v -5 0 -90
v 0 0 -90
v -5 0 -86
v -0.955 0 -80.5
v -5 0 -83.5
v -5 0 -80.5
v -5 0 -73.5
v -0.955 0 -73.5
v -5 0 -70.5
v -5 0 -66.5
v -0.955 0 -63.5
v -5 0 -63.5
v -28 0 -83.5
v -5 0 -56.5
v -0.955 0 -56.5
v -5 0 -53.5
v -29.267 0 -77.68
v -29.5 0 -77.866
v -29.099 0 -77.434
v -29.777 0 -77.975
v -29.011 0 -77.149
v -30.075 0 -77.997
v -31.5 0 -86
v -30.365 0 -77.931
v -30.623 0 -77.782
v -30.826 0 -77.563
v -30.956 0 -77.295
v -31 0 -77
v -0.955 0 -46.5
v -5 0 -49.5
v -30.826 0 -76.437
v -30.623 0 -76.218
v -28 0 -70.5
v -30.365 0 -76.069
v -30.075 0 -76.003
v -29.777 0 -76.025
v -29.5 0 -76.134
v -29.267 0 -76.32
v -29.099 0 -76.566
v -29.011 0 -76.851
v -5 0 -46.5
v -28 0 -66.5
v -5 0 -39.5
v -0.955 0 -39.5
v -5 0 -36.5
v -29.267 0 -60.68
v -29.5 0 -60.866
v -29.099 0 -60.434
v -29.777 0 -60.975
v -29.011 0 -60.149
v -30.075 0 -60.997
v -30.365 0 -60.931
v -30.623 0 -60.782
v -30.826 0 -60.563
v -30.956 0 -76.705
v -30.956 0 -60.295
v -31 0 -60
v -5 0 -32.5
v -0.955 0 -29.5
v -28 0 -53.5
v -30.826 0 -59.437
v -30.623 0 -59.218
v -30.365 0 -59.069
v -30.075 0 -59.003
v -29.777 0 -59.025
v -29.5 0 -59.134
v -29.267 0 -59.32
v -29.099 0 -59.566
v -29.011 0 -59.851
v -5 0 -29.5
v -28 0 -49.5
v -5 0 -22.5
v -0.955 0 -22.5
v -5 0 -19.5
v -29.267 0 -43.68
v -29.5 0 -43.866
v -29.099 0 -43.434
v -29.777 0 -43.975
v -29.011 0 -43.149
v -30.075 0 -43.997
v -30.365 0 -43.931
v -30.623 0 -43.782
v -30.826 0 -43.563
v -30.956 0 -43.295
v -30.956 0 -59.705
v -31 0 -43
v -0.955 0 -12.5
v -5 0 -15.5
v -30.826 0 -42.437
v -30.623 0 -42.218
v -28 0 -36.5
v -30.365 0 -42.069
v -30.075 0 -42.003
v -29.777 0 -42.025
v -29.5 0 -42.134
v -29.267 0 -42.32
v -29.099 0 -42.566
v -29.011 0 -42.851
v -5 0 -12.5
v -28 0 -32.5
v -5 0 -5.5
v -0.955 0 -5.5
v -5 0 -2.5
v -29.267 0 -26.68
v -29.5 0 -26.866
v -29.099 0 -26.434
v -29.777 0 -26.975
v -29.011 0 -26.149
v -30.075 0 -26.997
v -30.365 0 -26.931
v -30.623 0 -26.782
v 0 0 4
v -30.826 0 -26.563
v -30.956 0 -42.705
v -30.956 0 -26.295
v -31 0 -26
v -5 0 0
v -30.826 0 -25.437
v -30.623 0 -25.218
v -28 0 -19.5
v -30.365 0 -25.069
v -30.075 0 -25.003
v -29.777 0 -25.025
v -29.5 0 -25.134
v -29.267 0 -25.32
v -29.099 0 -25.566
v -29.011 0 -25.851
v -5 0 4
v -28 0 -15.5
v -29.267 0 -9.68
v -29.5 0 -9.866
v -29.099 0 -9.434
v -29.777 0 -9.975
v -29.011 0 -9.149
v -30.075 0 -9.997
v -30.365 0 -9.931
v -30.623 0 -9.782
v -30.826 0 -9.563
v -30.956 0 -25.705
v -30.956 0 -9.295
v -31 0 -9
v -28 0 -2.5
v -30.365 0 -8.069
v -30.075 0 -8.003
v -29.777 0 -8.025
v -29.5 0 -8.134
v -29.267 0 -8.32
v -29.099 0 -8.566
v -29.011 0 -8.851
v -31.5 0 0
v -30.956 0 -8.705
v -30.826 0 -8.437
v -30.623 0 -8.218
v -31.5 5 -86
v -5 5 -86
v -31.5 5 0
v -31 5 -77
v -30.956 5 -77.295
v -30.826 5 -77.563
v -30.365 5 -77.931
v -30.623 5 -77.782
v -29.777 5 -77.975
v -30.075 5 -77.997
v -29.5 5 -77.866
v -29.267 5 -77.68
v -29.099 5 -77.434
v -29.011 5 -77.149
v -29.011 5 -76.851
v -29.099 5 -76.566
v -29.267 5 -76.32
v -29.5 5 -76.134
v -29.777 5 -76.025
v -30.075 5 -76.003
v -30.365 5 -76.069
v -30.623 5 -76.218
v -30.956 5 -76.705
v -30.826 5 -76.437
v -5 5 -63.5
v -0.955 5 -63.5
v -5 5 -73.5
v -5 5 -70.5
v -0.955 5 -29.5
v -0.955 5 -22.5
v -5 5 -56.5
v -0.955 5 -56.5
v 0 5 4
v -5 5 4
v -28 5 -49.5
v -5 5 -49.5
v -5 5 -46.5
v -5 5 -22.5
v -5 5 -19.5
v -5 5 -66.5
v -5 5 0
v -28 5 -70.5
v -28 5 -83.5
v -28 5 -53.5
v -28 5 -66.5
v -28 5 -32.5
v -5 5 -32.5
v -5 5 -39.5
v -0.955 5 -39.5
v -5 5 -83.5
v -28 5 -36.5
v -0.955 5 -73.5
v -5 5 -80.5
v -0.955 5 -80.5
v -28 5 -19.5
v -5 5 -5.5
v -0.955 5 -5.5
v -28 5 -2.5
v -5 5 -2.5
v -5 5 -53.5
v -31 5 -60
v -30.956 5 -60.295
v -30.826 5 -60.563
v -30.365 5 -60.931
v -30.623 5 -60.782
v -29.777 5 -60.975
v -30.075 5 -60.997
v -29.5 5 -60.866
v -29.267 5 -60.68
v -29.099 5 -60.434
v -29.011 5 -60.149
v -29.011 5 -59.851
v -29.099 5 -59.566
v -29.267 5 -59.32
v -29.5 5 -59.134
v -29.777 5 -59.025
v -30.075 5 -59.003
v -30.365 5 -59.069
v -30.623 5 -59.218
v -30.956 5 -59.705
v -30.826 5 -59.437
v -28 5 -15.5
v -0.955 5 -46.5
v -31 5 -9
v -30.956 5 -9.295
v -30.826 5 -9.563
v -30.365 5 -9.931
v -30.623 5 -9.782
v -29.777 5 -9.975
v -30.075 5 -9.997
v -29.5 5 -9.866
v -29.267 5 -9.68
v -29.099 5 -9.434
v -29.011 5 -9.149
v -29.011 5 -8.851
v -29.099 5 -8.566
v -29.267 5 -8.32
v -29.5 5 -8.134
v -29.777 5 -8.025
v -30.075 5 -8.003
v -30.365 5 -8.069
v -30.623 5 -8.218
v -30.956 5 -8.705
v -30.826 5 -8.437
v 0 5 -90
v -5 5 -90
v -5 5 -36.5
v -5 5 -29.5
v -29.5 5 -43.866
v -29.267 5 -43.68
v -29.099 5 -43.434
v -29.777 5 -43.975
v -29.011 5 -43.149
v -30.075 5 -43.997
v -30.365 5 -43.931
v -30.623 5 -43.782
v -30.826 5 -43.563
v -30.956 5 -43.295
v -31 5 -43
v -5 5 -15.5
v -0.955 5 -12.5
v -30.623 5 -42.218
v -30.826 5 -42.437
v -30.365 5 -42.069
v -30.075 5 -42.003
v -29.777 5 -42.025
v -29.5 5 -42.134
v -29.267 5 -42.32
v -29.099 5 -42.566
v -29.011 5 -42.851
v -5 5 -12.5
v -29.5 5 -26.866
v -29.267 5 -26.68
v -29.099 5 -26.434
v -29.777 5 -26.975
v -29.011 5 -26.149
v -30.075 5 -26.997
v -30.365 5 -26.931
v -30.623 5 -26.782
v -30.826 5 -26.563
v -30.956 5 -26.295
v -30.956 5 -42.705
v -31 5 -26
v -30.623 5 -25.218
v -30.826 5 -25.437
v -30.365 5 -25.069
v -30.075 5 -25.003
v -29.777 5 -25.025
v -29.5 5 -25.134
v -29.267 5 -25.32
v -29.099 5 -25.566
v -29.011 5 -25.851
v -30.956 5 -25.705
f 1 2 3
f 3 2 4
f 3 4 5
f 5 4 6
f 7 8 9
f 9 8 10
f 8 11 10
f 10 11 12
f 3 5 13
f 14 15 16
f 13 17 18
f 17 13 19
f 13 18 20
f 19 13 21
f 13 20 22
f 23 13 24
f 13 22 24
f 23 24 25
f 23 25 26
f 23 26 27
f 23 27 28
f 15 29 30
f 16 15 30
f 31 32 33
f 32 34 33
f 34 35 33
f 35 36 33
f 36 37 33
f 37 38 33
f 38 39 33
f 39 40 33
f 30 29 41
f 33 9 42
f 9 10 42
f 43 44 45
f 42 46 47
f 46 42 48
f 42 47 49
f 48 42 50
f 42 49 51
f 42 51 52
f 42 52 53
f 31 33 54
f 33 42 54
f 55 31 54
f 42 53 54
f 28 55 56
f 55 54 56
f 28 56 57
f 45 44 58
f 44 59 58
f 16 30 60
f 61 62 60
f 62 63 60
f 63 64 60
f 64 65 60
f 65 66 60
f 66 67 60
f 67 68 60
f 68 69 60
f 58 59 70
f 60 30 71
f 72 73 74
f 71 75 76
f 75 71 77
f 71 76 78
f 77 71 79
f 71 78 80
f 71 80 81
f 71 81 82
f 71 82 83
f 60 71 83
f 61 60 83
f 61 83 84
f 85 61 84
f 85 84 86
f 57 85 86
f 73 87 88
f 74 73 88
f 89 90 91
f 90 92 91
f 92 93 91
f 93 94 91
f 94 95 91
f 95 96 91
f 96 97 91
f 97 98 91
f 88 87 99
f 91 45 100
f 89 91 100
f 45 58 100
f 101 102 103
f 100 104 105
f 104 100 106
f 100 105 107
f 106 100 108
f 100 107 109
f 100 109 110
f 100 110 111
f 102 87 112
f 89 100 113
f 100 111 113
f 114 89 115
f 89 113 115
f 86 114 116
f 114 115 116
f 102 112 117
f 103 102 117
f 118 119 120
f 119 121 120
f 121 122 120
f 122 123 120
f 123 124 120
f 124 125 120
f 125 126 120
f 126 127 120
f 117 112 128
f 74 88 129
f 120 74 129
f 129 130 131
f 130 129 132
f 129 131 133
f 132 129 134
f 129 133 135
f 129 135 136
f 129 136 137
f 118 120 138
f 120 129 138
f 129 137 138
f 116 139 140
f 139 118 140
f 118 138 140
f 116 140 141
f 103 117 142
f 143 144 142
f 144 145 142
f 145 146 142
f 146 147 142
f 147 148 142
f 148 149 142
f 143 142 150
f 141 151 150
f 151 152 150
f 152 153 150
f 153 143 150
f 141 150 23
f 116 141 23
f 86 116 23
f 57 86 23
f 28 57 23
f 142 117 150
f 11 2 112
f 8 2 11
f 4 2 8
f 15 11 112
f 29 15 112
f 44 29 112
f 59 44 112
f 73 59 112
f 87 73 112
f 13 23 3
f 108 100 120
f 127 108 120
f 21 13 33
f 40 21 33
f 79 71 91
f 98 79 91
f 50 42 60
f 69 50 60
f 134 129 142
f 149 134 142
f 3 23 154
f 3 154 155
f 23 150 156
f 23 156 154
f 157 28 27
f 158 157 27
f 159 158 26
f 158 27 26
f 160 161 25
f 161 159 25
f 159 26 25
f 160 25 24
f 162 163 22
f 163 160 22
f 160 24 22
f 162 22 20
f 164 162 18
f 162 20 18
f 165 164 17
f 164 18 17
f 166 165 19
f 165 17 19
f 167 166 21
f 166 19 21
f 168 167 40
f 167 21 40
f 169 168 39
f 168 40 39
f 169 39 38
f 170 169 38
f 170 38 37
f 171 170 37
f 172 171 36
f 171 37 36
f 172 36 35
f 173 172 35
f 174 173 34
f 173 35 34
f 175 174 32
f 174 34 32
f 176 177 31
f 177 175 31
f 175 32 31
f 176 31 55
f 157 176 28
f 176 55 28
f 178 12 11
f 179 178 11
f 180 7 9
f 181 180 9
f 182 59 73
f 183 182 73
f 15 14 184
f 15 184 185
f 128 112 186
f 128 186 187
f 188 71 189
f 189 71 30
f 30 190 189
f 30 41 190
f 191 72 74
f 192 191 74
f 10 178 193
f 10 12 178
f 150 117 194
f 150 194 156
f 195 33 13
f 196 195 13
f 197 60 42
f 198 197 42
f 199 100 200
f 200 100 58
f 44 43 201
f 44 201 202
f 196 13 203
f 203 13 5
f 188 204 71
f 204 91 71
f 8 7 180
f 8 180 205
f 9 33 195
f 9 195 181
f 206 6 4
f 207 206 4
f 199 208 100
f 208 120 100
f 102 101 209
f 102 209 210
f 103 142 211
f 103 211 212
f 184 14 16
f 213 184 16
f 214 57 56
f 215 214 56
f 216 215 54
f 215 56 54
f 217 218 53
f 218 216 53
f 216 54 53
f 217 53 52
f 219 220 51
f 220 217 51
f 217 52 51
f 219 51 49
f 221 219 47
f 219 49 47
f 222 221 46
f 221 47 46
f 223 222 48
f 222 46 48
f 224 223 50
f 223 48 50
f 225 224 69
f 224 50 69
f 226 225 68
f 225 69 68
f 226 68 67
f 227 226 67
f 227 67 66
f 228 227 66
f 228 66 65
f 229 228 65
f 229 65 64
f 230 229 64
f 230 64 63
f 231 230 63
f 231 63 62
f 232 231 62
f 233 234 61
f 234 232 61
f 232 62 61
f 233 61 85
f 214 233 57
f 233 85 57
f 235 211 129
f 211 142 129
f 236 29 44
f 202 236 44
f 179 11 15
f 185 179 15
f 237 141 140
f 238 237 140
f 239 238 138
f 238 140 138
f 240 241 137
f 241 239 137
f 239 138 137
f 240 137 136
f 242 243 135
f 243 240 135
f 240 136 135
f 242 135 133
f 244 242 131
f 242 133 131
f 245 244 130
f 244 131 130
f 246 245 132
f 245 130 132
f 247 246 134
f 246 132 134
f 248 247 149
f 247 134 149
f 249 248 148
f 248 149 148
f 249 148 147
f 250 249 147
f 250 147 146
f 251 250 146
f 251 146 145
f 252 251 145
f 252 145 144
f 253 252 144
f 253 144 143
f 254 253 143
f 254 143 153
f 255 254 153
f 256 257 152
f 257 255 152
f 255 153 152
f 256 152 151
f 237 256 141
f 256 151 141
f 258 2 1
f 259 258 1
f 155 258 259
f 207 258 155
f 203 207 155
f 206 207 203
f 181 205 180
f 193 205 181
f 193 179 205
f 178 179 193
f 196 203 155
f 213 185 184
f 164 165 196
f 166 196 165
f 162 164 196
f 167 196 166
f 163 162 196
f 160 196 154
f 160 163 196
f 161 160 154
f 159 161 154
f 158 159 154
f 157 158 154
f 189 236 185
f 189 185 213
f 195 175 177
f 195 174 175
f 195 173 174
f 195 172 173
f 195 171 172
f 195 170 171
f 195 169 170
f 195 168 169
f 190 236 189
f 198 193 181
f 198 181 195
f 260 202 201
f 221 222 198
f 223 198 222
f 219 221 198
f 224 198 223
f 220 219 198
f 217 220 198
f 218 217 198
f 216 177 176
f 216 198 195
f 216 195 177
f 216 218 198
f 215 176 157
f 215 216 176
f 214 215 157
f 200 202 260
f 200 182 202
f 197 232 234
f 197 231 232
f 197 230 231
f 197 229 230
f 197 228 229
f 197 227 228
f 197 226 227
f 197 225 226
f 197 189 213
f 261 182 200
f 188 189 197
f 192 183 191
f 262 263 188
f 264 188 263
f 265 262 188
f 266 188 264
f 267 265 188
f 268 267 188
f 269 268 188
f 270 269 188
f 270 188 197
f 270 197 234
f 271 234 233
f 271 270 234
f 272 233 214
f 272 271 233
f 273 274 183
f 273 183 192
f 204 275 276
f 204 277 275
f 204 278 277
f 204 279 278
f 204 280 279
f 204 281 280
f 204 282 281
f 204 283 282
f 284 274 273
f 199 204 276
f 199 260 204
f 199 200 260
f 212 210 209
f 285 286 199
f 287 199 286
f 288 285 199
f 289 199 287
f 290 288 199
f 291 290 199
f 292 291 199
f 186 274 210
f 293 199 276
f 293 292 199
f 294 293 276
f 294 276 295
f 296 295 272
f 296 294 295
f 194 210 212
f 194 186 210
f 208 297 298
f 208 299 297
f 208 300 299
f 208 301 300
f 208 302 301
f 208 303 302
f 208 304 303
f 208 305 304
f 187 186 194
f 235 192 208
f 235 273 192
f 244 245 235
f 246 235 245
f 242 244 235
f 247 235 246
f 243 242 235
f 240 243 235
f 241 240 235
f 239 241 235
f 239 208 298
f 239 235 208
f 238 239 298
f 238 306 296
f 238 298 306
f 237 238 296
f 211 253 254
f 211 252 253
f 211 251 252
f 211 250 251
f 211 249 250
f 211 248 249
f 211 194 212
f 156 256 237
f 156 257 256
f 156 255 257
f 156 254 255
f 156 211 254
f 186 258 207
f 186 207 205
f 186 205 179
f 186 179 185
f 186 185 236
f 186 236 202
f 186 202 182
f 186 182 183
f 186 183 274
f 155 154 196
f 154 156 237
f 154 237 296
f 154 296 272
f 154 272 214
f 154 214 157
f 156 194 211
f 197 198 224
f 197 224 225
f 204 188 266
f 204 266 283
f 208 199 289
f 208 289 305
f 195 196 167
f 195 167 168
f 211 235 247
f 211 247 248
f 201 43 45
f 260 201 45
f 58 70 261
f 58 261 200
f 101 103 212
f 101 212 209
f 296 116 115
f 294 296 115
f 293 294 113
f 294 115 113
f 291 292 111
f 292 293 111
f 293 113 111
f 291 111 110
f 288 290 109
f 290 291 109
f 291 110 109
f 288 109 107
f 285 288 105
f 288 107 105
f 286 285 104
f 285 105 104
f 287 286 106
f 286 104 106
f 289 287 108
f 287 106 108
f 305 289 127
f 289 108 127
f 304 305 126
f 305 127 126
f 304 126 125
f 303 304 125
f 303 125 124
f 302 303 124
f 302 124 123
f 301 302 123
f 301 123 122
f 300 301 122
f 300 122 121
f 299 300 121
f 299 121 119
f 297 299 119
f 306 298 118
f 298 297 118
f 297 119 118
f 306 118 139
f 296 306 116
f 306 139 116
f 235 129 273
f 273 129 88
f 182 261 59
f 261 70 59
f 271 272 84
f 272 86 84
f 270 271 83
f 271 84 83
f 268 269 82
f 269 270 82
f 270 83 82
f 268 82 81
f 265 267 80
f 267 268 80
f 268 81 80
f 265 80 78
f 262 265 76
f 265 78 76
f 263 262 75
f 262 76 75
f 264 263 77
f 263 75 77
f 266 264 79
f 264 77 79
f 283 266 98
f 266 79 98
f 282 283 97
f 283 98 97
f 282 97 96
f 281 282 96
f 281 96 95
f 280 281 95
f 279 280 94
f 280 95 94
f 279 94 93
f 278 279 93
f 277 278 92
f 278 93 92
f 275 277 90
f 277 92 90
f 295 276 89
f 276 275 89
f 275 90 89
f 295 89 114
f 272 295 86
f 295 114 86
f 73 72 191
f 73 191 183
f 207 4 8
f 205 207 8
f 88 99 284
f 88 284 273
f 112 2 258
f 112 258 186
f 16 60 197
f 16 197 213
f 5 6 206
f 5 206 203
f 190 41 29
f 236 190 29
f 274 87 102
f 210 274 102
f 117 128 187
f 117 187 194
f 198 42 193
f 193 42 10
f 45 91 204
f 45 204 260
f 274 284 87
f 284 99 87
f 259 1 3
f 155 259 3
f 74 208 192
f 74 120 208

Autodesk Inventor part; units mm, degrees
ref_plane "YZ Plane" through (0, 0, 0) normal (1, 0, 0) x (0, 1, 0)
ref_plane "XZ Plane" through (0, 0, 0) normal (0, 1, 0) x (-1, 0, 0)
ref_plane "XY Plane" through (0, 0, 0) normal (0, 0, 1) x (1, 0, 0)
sketch "Sketch1" plane through (0, 0, 0) normal (0, 1, 0) x (-1, 0, 0)
  line L0 (0, 0) -> (27.5, 0)
  line L1 (27.5, 0) -> (27.5, -2.5)
  line L2 (27.5, -2.5) -> (5, -2.5)
  line L3 (5, -2.5) -> (5, -15.5)
  line L4 (5, -15.5) -> (27.5, -15.5)
  line L5 (27.5, -15.5) -> (27.5, -18)
  line L6 (27.5, -18) -> (0, -18)
  line L7 (0, -18) -> (0, 0)
  line L8 (27.5, -2.5) -> (28, -2.5)
  line L9 (28, -2.5) -> (28, -15.5)
  line L10 (28, -15.5) -> (27.5, -15.5)
  line L11 (27.5, 0) -> (31.5, 0)
  line L12 (31.5, 0) -> (31.5, -18)
  line L13 (31.5, -18) -> (27.5, -18)
  circle A0 centre (30, -9) radius 1
  line L14 (5, -5.5) -> (0, -5.5)
  line L15 (5, -12.5) -> (0, -12.5)
  line L16 (0, 0) -> (0, 4)
  line L17 (0, 4) -> (5, 4)
  line L18 (5, 4) -> (5, 0)
  line L19 (0, -18) -> (0, -22)
  line L20 (0, -22) -> (5, -22)
  line L21 (5, -22) -> (5, -18)
  line L22 (0.9553, -12.5) -> (0.9553, -5.5)
  dimension "d1" = 2.5
  dimension "d2" = 22.5
  dimension "d4" = 2.5
  dimension "d5" = 5
  dimension "d9" = 13
  dimension "d16" = 0.5
  dimension "d17" = 4
  dimension "d19" = 2
  dimension "d20" = 6.5
  dimension "d21" = 3
  dimension "d22" = 3
  dimension "d23" = 4
  dimension "d24" = 4
extrude "Extrusion1" add sketch "Sketch1" along normal blind 5 contours L16 L17 L18 L0 | L0 L1 L2 L3 L14 L7 | L14 L22 L15 L7 | L11 L12 L13 L5 L10 L9 L8 L1 | L15 L3 L4 L5 L6 L7 | L6 L21 L20 L19
pattern_linear "Rectangular Pattern1" count 5 spacing 17 along (0, 0, -1)
properties part number "ServoHolder"
